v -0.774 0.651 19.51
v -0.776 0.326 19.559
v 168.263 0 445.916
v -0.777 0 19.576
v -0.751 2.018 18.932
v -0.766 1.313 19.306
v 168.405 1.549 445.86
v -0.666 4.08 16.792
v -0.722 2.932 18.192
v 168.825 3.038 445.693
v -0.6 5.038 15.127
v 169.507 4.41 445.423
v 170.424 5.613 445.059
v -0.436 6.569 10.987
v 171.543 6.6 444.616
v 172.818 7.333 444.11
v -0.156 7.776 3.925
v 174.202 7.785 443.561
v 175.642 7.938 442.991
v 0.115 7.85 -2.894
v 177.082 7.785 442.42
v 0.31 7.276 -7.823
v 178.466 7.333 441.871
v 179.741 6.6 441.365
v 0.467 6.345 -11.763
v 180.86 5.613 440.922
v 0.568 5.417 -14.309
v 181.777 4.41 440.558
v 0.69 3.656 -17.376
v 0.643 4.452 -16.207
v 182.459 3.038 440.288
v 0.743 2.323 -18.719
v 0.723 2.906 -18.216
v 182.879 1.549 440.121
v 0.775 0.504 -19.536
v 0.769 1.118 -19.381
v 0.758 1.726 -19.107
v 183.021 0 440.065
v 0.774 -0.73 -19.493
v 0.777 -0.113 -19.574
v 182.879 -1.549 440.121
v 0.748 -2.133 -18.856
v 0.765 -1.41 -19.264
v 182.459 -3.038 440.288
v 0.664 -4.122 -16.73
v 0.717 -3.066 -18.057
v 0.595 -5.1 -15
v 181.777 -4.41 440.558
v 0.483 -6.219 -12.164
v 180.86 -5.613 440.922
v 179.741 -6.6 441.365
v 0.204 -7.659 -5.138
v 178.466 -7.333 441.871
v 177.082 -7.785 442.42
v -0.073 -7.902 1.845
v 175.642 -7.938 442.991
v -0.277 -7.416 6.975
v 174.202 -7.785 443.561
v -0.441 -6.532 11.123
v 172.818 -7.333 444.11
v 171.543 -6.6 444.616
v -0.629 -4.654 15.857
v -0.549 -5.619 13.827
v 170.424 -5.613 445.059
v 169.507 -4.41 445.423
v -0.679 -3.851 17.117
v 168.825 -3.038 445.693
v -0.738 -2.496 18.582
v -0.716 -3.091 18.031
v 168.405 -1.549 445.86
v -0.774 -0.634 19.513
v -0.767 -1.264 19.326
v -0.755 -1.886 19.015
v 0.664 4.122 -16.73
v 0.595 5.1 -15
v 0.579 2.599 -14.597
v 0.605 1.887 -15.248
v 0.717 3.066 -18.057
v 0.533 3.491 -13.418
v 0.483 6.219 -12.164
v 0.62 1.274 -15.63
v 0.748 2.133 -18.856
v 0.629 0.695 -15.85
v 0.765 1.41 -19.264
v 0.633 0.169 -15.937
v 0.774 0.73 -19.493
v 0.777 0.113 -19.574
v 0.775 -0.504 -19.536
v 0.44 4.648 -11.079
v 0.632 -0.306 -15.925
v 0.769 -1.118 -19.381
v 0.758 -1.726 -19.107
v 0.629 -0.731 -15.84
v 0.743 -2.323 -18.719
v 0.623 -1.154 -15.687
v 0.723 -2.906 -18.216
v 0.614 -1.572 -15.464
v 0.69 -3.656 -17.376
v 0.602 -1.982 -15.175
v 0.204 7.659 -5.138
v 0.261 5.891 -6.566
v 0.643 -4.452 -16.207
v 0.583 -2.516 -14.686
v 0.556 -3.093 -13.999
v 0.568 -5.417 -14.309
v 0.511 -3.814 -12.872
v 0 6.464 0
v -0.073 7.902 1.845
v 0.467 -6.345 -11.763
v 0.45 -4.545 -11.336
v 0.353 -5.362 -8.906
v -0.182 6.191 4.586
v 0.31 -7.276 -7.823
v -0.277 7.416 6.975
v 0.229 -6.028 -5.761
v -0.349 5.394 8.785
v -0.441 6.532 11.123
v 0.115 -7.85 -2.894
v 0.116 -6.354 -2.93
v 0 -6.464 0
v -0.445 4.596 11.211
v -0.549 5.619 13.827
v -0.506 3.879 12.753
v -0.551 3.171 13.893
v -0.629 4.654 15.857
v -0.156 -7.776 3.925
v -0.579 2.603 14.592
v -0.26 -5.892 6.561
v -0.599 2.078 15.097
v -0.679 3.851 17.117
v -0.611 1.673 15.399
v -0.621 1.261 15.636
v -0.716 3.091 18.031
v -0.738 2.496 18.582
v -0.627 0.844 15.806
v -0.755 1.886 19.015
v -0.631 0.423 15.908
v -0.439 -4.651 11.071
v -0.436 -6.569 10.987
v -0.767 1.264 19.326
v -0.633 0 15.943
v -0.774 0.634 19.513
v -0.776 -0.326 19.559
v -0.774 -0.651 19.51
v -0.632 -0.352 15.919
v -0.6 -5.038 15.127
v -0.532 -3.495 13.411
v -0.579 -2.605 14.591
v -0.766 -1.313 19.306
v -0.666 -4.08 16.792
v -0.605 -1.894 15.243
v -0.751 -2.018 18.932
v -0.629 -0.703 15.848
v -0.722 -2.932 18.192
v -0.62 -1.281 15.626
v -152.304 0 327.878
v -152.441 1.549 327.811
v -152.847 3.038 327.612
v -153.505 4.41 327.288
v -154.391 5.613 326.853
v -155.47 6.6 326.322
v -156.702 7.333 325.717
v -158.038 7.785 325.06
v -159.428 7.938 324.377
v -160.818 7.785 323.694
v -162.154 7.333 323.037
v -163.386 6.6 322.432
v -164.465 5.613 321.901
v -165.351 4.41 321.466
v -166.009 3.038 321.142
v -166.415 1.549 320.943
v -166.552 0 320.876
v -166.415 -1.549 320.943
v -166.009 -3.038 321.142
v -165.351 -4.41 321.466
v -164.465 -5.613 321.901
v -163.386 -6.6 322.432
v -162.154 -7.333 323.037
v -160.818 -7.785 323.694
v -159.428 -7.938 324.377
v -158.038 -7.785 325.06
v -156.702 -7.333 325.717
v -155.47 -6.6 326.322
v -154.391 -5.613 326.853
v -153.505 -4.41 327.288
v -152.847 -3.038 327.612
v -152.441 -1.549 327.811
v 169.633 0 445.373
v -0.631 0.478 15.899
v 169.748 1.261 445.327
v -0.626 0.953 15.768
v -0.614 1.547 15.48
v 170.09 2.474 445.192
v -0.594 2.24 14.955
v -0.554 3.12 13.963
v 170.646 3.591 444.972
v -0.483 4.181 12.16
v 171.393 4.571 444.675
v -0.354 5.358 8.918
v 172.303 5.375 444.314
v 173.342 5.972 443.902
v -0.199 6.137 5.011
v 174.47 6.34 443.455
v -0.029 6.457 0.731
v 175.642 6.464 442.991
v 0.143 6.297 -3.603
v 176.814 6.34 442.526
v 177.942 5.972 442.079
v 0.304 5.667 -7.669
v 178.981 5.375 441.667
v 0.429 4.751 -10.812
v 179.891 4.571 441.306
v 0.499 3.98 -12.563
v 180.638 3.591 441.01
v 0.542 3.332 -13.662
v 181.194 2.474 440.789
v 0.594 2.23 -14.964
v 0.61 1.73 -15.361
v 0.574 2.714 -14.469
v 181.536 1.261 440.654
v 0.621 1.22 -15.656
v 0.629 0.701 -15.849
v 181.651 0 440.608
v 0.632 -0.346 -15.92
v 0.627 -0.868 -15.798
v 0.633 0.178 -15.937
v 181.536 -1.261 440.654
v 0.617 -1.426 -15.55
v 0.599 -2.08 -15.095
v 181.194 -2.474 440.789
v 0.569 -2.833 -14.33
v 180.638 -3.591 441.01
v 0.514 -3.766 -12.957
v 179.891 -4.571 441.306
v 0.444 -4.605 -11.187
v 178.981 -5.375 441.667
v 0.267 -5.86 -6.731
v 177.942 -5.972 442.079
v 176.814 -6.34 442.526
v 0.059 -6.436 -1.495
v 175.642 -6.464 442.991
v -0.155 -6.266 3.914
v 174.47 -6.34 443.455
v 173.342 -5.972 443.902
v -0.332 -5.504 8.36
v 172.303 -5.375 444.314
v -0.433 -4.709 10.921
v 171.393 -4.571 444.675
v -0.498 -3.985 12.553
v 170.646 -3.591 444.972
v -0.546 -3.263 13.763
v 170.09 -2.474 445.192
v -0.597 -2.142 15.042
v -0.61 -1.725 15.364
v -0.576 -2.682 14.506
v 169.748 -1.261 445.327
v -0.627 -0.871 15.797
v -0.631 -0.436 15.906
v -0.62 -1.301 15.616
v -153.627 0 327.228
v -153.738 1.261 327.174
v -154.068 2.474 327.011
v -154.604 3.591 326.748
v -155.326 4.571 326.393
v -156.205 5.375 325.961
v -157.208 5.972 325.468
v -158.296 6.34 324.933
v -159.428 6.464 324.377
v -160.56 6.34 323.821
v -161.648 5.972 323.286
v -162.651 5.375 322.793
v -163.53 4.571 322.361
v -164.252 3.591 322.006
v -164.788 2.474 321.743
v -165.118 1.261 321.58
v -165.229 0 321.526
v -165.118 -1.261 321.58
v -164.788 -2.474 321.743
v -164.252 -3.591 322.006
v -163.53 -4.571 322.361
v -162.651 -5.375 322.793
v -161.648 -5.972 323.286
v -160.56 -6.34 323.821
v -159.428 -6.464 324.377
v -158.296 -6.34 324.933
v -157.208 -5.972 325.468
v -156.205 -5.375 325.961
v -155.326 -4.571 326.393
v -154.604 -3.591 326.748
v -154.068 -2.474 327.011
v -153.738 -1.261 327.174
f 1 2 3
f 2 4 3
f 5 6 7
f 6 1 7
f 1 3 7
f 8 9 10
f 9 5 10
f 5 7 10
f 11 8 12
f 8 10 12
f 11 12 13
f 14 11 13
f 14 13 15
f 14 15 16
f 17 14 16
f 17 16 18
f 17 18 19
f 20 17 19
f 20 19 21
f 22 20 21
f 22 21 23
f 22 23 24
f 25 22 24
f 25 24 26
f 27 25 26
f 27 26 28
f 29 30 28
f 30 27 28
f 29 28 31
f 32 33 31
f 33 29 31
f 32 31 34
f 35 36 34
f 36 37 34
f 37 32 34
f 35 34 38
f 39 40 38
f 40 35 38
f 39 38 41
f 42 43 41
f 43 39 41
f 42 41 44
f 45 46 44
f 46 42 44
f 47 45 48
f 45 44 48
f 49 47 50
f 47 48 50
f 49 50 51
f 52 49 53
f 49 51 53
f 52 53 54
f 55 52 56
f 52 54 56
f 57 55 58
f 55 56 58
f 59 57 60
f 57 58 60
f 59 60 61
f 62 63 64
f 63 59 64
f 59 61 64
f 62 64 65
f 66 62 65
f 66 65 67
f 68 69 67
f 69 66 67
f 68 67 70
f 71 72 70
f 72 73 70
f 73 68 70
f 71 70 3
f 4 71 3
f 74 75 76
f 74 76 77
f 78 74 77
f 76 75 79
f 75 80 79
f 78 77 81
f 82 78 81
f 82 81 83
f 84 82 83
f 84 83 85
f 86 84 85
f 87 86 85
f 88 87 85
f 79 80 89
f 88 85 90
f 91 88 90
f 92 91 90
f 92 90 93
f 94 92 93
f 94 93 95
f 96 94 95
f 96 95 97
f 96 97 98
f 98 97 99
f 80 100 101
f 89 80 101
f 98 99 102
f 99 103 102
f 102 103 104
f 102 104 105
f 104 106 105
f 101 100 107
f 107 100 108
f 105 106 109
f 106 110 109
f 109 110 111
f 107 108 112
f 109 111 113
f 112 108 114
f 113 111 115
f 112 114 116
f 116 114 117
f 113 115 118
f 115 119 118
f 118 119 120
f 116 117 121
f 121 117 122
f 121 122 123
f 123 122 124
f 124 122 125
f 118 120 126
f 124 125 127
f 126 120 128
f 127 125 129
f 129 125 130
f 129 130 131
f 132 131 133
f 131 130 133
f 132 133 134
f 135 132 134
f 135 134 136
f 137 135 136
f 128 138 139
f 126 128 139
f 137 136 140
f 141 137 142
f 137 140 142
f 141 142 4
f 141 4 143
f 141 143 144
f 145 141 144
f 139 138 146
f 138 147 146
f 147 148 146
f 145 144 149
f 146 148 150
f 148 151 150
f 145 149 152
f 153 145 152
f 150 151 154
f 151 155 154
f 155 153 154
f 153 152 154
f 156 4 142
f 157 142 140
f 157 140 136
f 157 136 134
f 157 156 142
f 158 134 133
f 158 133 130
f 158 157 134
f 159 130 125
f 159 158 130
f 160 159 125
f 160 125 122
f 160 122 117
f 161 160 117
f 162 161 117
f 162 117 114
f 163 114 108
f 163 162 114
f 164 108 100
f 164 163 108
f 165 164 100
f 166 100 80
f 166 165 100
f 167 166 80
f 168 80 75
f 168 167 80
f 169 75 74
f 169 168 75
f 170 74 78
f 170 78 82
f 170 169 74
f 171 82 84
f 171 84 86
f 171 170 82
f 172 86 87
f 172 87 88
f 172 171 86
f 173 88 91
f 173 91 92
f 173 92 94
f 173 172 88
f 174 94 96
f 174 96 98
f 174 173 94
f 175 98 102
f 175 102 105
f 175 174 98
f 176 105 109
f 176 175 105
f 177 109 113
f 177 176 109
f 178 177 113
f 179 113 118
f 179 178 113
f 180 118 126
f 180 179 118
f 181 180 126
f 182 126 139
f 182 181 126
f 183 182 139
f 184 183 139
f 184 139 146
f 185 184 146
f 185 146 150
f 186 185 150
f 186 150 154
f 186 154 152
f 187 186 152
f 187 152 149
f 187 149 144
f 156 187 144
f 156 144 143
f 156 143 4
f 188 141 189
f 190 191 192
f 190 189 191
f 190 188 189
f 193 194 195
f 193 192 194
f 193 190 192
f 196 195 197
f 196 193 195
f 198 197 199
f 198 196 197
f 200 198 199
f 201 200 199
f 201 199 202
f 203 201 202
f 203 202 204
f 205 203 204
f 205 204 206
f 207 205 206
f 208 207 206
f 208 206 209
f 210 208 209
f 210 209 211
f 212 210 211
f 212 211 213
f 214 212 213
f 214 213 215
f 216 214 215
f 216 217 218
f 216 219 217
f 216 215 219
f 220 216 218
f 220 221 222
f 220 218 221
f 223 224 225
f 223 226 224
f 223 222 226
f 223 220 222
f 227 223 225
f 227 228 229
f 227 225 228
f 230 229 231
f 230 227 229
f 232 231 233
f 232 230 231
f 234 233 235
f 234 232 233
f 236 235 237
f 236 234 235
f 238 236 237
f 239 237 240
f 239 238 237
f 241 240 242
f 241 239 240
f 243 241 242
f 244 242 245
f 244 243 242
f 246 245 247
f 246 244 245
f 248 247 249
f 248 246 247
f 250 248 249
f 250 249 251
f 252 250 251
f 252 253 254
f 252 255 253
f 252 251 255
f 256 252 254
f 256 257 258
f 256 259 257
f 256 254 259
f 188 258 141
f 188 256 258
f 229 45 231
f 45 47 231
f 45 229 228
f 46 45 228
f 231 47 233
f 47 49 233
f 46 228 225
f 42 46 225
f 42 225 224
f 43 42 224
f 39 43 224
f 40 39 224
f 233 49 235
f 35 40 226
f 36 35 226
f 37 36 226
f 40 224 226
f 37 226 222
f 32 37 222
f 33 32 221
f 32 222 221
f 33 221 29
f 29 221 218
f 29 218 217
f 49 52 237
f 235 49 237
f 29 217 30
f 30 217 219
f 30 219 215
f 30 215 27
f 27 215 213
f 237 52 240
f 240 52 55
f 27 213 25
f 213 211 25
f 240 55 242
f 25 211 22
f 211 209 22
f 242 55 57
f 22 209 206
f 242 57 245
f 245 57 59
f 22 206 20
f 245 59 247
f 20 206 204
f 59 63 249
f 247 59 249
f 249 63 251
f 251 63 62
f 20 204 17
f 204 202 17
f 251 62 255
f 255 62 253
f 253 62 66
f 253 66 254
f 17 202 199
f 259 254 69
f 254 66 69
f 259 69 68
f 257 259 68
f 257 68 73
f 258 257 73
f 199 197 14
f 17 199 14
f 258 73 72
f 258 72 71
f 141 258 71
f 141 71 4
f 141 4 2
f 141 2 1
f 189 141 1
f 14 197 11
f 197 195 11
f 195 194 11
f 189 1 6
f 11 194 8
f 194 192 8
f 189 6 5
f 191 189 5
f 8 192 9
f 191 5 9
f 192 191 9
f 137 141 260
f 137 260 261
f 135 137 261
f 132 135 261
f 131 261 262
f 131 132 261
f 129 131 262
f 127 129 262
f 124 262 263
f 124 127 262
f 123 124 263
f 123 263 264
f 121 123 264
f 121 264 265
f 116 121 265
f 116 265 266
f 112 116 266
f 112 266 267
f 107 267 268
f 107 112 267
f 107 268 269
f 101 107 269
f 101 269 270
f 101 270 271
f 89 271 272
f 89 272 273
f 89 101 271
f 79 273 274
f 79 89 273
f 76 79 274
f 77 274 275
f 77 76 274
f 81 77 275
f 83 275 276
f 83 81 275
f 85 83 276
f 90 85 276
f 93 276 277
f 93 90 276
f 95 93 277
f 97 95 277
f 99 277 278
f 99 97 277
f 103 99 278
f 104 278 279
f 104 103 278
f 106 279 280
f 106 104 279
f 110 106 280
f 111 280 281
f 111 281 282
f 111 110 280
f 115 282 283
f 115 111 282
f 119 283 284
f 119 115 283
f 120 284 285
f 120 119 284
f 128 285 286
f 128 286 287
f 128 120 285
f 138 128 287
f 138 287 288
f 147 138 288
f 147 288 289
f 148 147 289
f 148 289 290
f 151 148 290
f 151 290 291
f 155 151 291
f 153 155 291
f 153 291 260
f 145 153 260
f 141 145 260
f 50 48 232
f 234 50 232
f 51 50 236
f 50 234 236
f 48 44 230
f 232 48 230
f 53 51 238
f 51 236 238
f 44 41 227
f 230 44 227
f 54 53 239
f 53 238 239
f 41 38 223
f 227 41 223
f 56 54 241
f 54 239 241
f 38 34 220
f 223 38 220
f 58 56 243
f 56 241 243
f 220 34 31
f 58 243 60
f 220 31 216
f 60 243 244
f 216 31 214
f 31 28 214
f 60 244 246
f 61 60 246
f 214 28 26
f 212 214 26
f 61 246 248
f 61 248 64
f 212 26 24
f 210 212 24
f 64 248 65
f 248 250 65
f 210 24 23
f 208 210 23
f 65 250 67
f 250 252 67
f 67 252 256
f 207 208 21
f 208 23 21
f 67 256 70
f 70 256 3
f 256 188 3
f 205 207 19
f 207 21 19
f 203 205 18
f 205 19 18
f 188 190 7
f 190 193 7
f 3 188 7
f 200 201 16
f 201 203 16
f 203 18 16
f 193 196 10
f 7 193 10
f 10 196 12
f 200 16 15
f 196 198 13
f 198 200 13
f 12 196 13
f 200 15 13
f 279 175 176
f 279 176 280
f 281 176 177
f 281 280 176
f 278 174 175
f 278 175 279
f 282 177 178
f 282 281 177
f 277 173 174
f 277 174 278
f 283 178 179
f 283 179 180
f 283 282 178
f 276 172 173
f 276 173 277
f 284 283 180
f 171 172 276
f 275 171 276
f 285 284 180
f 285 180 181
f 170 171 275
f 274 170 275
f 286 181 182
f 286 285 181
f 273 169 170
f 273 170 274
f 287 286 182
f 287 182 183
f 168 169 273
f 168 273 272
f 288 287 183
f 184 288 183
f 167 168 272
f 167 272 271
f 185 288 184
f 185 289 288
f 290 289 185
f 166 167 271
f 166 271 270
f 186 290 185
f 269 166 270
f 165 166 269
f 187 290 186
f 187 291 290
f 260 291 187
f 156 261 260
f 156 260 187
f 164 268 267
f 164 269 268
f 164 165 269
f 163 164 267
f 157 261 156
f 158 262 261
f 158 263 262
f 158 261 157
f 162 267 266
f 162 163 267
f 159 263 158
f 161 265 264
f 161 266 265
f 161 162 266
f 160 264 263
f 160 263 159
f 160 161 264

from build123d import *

# Parameters (mm, degrees)
SKETCH11_ON_SEGMENT_1_R         = 7.9375
SKETCH11_ON_SEGMENT_1_R_2       = 6.4643
STRUCTURAL_MEMBER1_DEPTH        = 502.870881135
SKETCH11_R                      = 7.9375
SKETCH11_R_2                    = 6.4643
STRUCTURAL_MEMBER1_2_DEPTH      = 361.438445442
STRUCTURAL_MEMBER1_2_DEPTH_BACK = 26.330451864


with BuildPart() as part:
    # Sketch11 on segment 1 (carried to segment 1) → Structural Member1 (new body)
    with BuildSketch(Plane(origin=(175.642001203, 0, 442.990595998), x_dir=(-0.929597089, 0, 0.368577335), z_dir=(-0.368577335, 0, -0.929597089))):
        Circle(SKETCH11_ON_SEGMENT_1_R)
        Circle(SKETCH11_ON_SEGMENT_1_R_2, mode=Mode.SUBTRACT)
    extrude(amount=STRUCTURAL_MEMBER1_DEPTH)

    # Structural Member1 mitre 1
    split(bisect_by=Plane(origin=(0, 0, 0), x_dir=(0, 1, 0), z_dir=(0.999213287, 0, 0.039658638)), keep=Keep.TOP)


with BuildPart() as body_2:
    # Sketch11 → Structural Member1 2 (new, two sides)
    with BuildSketch(Plane(origin=(0, 0, 0), x_dir=(0.8974613837581003, 0, 0.4410930340222977), z_dir=(-0.4410930340222977, 0, 0.8974613837581003))) as structural_member1_2_sk:
        Circle(SKETCH11_R)
        Circle(SKETCH11_R_2, mode=Mode.SUBTRACT)
    extrude(amount=STRUCTURAL_MEMBER1_2_DEPTH)
    extrude(structural_member1_2_sk.sketch, amount=-STRUCTURAL_MEMBER1_2_DEPTH_BACK)

    # Structural Member1 2 mitre 1
    split(bisect_by=Plane(origin=(0, 0, 0), x_dir=(0, -1, 0), z_dir=(-0.999213287, 0, -0.039658638)), keep=Keep.TOP)


solid = Compound([part.part, body_2.part])
